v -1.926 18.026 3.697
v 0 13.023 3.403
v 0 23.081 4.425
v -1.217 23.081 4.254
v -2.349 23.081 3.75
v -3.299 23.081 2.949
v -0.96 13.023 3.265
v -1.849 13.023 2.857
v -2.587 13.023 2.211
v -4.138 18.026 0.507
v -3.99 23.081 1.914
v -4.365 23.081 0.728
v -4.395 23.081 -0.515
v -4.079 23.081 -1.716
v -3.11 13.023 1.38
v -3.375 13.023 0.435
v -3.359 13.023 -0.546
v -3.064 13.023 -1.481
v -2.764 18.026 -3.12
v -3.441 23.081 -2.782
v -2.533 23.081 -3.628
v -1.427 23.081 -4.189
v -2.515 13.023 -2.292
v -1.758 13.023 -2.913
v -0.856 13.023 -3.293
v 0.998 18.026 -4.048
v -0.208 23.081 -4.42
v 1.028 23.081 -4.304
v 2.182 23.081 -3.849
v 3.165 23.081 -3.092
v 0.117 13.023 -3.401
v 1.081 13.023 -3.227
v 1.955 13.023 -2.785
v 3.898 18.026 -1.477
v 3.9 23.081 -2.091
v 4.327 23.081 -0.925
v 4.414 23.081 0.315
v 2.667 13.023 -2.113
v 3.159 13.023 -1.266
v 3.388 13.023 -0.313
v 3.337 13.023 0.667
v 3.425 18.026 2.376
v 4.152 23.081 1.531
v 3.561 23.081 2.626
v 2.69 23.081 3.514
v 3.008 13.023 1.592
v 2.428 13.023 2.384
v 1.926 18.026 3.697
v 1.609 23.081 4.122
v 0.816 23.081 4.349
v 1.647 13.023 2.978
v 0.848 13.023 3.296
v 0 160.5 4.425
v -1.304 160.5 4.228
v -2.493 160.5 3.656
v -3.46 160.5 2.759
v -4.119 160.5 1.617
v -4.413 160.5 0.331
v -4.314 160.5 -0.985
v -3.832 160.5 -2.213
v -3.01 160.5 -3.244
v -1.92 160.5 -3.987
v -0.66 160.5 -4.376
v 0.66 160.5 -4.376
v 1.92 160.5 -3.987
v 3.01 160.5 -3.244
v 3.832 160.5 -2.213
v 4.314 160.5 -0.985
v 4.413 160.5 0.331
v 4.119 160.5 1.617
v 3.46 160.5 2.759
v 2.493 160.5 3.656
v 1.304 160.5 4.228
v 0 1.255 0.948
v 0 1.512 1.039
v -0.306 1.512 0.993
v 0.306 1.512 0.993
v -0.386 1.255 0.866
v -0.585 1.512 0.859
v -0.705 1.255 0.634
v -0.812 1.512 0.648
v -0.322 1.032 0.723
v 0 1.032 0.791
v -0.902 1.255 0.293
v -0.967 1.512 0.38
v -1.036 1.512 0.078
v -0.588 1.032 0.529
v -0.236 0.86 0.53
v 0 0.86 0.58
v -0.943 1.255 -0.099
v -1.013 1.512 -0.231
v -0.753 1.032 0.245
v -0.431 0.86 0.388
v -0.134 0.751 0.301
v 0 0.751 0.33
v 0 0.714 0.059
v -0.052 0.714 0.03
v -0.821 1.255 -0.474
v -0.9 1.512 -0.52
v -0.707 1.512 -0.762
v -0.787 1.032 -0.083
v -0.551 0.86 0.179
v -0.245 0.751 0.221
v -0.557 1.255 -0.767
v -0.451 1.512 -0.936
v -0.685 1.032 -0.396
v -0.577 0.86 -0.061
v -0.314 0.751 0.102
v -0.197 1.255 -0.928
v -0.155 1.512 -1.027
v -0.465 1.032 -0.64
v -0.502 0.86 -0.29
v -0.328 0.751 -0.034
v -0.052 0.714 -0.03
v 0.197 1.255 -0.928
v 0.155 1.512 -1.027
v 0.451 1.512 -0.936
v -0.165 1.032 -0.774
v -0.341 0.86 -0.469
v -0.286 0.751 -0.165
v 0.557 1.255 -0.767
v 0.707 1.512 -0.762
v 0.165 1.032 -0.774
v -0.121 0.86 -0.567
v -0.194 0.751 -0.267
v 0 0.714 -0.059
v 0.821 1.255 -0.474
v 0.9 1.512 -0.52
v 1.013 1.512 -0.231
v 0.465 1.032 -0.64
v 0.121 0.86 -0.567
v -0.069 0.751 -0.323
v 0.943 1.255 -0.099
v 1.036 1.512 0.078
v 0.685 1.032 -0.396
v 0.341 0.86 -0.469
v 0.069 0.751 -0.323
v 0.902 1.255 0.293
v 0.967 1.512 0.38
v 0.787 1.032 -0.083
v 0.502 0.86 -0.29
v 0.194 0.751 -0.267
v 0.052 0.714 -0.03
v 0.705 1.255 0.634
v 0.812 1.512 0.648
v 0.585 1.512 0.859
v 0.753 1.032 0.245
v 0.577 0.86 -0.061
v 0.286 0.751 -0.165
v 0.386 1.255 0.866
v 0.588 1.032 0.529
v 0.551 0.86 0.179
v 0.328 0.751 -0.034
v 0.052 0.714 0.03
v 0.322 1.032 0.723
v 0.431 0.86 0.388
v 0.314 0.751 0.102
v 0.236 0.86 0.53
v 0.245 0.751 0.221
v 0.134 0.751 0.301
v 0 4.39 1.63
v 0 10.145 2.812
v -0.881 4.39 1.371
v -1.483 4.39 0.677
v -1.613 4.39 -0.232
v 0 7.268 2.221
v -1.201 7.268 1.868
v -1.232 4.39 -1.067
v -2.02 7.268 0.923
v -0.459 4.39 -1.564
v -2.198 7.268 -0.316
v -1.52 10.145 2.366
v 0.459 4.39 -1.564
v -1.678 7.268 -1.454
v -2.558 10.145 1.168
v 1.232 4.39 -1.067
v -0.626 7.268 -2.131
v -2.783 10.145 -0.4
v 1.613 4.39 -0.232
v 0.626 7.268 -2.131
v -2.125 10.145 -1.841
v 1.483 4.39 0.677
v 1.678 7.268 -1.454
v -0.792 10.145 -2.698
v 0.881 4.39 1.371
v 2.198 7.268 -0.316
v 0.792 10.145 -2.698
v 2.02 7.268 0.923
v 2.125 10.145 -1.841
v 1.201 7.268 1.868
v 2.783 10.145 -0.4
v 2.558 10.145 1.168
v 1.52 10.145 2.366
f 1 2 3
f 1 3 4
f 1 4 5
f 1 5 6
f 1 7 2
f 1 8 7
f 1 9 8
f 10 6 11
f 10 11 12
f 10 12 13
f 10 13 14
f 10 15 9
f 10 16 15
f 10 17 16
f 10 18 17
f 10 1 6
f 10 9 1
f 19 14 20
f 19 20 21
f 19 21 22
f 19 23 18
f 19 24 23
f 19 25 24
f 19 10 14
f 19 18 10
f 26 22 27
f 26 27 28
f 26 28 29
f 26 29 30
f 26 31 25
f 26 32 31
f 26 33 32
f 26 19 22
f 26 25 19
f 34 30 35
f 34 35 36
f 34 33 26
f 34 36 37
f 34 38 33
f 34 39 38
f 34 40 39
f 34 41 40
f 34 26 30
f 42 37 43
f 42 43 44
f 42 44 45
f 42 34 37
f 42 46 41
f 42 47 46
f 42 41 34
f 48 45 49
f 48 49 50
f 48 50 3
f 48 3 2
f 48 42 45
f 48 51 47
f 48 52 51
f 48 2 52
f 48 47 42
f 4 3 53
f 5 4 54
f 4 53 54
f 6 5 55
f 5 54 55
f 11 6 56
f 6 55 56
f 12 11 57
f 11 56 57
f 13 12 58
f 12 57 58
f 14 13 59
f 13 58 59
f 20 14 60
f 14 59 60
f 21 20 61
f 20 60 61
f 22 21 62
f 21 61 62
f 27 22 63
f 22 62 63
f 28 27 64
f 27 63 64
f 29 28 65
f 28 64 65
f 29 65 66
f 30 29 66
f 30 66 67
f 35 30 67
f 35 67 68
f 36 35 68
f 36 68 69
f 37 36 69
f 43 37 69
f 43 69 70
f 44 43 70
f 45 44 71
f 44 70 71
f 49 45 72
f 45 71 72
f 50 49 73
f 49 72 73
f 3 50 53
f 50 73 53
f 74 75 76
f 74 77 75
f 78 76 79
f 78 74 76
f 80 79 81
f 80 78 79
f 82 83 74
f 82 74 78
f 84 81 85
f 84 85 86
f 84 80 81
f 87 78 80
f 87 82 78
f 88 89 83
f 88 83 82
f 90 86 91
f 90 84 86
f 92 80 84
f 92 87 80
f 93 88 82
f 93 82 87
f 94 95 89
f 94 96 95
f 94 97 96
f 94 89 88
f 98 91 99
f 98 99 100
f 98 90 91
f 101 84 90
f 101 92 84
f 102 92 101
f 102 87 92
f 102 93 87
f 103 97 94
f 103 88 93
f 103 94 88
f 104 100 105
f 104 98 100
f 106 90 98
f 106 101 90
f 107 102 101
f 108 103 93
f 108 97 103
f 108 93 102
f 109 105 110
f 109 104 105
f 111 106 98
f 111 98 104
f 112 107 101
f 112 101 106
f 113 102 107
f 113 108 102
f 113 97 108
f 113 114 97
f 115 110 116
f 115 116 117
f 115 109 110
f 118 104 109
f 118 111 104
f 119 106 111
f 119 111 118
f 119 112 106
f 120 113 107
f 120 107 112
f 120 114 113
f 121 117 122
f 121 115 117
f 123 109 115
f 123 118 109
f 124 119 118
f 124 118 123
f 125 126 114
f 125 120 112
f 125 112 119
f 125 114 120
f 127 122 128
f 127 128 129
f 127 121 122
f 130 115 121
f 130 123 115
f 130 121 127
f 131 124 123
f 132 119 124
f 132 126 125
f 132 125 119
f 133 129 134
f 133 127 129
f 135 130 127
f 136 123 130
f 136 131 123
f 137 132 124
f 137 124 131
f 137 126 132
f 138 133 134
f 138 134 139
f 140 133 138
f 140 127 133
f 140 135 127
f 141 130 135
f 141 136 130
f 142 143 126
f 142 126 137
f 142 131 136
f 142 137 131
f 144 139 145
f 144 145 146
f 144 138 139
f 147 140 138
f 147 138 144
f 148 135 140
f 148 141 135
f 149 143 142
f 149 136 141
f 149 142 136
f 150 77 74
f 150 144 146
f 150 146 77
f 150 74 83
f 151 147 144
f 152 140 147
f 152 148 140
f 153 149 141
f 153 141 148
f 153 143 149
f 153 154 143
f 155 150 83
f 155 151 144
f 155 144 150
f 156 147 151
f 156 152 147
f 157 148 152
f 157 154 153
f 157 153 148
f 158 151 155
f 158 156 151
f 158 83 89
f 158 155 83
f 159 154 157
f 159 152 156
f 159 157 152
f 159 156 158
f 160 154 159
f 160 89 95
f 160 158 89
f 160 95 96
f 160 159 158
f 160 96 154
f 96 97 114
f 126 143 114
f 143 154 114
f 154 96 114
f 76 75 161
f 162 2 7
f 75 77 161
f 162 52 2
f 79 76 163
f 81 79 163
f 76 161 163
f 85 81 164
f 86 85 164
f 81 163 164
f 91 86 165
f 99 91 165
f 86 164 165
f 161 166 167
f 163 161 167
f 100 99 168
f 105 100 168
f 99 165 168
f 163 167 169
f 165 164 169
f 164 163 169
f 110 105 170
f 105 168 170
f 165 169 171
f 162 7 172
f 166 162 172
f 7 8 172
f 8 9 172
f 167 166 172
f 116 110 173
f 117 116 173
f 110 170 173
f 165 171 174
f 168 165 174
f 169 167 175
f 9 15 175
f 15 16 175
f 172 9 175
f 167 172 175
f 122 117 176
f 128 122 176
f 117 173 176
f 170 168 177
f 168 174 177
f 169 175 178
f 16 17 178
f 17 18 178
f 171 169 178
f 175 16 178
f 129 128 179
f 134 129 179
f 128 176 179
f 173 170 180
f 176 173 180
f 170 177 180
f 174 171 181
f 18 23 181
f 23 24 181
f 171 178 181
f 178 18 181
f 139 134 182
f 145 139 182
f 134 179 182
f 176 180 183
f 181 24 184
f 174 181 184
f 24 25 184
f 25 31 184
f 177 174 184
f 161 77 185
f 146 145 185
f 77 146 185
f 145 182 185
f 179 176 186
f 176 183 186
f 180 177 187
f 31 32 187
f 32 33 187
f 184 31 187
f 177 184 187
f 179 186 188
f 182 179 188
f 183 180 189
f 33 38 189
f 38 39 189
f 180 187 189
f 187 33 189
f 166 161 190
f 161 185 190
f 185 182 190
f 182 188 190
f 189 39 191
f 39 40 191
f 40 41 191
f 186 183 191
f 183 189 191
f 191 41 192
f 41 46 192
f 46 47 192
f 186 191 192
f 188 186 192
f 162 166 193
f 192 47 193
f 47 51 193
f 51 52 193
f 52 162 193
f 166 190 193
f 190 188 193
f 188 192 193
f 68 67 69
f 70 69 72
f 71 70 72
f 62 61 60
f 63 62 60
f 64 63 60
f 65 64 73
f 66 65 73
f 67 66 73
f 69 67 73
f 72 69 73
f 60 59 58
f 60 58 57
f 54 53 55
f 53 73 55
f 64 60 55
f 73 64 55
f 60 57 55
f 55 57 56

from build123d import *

# Parameters (mm, degrees)
FILLET1_R = 1
FILLET2_R = 50


with BuildPart() as part:
    # Sketch1 → Revolve1 (revolve)
    with BuildSketch(Plane.XY, mode=Mode.PRIVATE) as revolve1_sk:
        Polygon((0.875, 0.713567683), (4.425, 18), (4.425, 160.5), (0, 160.5), (0, 0.713567683), align=None)
    revolve(revolve1_sk.sketch.rotate(Axis((0, 160.5, 0), (0, -1, 0)), 90), axis=Axis((0, 160.5, 0), (0, -1, 0)))

    # Fillet1
    fillet1_edges = [part.edges().sort_by_distance(p)[0] for p in [
        (0, 0.713567683, -0.875),
    ]]
    fillet(fillet1_edges, radius=FILLET1_R)

    # Fillet2
    fillet2_edges = [part.edges().sort_by_distance(p)[0] for p in [
        (0, 18, -4.425),
    ]]
    fillet(fillet2_edges, radius=FILLET2_R)


solid = part.part
